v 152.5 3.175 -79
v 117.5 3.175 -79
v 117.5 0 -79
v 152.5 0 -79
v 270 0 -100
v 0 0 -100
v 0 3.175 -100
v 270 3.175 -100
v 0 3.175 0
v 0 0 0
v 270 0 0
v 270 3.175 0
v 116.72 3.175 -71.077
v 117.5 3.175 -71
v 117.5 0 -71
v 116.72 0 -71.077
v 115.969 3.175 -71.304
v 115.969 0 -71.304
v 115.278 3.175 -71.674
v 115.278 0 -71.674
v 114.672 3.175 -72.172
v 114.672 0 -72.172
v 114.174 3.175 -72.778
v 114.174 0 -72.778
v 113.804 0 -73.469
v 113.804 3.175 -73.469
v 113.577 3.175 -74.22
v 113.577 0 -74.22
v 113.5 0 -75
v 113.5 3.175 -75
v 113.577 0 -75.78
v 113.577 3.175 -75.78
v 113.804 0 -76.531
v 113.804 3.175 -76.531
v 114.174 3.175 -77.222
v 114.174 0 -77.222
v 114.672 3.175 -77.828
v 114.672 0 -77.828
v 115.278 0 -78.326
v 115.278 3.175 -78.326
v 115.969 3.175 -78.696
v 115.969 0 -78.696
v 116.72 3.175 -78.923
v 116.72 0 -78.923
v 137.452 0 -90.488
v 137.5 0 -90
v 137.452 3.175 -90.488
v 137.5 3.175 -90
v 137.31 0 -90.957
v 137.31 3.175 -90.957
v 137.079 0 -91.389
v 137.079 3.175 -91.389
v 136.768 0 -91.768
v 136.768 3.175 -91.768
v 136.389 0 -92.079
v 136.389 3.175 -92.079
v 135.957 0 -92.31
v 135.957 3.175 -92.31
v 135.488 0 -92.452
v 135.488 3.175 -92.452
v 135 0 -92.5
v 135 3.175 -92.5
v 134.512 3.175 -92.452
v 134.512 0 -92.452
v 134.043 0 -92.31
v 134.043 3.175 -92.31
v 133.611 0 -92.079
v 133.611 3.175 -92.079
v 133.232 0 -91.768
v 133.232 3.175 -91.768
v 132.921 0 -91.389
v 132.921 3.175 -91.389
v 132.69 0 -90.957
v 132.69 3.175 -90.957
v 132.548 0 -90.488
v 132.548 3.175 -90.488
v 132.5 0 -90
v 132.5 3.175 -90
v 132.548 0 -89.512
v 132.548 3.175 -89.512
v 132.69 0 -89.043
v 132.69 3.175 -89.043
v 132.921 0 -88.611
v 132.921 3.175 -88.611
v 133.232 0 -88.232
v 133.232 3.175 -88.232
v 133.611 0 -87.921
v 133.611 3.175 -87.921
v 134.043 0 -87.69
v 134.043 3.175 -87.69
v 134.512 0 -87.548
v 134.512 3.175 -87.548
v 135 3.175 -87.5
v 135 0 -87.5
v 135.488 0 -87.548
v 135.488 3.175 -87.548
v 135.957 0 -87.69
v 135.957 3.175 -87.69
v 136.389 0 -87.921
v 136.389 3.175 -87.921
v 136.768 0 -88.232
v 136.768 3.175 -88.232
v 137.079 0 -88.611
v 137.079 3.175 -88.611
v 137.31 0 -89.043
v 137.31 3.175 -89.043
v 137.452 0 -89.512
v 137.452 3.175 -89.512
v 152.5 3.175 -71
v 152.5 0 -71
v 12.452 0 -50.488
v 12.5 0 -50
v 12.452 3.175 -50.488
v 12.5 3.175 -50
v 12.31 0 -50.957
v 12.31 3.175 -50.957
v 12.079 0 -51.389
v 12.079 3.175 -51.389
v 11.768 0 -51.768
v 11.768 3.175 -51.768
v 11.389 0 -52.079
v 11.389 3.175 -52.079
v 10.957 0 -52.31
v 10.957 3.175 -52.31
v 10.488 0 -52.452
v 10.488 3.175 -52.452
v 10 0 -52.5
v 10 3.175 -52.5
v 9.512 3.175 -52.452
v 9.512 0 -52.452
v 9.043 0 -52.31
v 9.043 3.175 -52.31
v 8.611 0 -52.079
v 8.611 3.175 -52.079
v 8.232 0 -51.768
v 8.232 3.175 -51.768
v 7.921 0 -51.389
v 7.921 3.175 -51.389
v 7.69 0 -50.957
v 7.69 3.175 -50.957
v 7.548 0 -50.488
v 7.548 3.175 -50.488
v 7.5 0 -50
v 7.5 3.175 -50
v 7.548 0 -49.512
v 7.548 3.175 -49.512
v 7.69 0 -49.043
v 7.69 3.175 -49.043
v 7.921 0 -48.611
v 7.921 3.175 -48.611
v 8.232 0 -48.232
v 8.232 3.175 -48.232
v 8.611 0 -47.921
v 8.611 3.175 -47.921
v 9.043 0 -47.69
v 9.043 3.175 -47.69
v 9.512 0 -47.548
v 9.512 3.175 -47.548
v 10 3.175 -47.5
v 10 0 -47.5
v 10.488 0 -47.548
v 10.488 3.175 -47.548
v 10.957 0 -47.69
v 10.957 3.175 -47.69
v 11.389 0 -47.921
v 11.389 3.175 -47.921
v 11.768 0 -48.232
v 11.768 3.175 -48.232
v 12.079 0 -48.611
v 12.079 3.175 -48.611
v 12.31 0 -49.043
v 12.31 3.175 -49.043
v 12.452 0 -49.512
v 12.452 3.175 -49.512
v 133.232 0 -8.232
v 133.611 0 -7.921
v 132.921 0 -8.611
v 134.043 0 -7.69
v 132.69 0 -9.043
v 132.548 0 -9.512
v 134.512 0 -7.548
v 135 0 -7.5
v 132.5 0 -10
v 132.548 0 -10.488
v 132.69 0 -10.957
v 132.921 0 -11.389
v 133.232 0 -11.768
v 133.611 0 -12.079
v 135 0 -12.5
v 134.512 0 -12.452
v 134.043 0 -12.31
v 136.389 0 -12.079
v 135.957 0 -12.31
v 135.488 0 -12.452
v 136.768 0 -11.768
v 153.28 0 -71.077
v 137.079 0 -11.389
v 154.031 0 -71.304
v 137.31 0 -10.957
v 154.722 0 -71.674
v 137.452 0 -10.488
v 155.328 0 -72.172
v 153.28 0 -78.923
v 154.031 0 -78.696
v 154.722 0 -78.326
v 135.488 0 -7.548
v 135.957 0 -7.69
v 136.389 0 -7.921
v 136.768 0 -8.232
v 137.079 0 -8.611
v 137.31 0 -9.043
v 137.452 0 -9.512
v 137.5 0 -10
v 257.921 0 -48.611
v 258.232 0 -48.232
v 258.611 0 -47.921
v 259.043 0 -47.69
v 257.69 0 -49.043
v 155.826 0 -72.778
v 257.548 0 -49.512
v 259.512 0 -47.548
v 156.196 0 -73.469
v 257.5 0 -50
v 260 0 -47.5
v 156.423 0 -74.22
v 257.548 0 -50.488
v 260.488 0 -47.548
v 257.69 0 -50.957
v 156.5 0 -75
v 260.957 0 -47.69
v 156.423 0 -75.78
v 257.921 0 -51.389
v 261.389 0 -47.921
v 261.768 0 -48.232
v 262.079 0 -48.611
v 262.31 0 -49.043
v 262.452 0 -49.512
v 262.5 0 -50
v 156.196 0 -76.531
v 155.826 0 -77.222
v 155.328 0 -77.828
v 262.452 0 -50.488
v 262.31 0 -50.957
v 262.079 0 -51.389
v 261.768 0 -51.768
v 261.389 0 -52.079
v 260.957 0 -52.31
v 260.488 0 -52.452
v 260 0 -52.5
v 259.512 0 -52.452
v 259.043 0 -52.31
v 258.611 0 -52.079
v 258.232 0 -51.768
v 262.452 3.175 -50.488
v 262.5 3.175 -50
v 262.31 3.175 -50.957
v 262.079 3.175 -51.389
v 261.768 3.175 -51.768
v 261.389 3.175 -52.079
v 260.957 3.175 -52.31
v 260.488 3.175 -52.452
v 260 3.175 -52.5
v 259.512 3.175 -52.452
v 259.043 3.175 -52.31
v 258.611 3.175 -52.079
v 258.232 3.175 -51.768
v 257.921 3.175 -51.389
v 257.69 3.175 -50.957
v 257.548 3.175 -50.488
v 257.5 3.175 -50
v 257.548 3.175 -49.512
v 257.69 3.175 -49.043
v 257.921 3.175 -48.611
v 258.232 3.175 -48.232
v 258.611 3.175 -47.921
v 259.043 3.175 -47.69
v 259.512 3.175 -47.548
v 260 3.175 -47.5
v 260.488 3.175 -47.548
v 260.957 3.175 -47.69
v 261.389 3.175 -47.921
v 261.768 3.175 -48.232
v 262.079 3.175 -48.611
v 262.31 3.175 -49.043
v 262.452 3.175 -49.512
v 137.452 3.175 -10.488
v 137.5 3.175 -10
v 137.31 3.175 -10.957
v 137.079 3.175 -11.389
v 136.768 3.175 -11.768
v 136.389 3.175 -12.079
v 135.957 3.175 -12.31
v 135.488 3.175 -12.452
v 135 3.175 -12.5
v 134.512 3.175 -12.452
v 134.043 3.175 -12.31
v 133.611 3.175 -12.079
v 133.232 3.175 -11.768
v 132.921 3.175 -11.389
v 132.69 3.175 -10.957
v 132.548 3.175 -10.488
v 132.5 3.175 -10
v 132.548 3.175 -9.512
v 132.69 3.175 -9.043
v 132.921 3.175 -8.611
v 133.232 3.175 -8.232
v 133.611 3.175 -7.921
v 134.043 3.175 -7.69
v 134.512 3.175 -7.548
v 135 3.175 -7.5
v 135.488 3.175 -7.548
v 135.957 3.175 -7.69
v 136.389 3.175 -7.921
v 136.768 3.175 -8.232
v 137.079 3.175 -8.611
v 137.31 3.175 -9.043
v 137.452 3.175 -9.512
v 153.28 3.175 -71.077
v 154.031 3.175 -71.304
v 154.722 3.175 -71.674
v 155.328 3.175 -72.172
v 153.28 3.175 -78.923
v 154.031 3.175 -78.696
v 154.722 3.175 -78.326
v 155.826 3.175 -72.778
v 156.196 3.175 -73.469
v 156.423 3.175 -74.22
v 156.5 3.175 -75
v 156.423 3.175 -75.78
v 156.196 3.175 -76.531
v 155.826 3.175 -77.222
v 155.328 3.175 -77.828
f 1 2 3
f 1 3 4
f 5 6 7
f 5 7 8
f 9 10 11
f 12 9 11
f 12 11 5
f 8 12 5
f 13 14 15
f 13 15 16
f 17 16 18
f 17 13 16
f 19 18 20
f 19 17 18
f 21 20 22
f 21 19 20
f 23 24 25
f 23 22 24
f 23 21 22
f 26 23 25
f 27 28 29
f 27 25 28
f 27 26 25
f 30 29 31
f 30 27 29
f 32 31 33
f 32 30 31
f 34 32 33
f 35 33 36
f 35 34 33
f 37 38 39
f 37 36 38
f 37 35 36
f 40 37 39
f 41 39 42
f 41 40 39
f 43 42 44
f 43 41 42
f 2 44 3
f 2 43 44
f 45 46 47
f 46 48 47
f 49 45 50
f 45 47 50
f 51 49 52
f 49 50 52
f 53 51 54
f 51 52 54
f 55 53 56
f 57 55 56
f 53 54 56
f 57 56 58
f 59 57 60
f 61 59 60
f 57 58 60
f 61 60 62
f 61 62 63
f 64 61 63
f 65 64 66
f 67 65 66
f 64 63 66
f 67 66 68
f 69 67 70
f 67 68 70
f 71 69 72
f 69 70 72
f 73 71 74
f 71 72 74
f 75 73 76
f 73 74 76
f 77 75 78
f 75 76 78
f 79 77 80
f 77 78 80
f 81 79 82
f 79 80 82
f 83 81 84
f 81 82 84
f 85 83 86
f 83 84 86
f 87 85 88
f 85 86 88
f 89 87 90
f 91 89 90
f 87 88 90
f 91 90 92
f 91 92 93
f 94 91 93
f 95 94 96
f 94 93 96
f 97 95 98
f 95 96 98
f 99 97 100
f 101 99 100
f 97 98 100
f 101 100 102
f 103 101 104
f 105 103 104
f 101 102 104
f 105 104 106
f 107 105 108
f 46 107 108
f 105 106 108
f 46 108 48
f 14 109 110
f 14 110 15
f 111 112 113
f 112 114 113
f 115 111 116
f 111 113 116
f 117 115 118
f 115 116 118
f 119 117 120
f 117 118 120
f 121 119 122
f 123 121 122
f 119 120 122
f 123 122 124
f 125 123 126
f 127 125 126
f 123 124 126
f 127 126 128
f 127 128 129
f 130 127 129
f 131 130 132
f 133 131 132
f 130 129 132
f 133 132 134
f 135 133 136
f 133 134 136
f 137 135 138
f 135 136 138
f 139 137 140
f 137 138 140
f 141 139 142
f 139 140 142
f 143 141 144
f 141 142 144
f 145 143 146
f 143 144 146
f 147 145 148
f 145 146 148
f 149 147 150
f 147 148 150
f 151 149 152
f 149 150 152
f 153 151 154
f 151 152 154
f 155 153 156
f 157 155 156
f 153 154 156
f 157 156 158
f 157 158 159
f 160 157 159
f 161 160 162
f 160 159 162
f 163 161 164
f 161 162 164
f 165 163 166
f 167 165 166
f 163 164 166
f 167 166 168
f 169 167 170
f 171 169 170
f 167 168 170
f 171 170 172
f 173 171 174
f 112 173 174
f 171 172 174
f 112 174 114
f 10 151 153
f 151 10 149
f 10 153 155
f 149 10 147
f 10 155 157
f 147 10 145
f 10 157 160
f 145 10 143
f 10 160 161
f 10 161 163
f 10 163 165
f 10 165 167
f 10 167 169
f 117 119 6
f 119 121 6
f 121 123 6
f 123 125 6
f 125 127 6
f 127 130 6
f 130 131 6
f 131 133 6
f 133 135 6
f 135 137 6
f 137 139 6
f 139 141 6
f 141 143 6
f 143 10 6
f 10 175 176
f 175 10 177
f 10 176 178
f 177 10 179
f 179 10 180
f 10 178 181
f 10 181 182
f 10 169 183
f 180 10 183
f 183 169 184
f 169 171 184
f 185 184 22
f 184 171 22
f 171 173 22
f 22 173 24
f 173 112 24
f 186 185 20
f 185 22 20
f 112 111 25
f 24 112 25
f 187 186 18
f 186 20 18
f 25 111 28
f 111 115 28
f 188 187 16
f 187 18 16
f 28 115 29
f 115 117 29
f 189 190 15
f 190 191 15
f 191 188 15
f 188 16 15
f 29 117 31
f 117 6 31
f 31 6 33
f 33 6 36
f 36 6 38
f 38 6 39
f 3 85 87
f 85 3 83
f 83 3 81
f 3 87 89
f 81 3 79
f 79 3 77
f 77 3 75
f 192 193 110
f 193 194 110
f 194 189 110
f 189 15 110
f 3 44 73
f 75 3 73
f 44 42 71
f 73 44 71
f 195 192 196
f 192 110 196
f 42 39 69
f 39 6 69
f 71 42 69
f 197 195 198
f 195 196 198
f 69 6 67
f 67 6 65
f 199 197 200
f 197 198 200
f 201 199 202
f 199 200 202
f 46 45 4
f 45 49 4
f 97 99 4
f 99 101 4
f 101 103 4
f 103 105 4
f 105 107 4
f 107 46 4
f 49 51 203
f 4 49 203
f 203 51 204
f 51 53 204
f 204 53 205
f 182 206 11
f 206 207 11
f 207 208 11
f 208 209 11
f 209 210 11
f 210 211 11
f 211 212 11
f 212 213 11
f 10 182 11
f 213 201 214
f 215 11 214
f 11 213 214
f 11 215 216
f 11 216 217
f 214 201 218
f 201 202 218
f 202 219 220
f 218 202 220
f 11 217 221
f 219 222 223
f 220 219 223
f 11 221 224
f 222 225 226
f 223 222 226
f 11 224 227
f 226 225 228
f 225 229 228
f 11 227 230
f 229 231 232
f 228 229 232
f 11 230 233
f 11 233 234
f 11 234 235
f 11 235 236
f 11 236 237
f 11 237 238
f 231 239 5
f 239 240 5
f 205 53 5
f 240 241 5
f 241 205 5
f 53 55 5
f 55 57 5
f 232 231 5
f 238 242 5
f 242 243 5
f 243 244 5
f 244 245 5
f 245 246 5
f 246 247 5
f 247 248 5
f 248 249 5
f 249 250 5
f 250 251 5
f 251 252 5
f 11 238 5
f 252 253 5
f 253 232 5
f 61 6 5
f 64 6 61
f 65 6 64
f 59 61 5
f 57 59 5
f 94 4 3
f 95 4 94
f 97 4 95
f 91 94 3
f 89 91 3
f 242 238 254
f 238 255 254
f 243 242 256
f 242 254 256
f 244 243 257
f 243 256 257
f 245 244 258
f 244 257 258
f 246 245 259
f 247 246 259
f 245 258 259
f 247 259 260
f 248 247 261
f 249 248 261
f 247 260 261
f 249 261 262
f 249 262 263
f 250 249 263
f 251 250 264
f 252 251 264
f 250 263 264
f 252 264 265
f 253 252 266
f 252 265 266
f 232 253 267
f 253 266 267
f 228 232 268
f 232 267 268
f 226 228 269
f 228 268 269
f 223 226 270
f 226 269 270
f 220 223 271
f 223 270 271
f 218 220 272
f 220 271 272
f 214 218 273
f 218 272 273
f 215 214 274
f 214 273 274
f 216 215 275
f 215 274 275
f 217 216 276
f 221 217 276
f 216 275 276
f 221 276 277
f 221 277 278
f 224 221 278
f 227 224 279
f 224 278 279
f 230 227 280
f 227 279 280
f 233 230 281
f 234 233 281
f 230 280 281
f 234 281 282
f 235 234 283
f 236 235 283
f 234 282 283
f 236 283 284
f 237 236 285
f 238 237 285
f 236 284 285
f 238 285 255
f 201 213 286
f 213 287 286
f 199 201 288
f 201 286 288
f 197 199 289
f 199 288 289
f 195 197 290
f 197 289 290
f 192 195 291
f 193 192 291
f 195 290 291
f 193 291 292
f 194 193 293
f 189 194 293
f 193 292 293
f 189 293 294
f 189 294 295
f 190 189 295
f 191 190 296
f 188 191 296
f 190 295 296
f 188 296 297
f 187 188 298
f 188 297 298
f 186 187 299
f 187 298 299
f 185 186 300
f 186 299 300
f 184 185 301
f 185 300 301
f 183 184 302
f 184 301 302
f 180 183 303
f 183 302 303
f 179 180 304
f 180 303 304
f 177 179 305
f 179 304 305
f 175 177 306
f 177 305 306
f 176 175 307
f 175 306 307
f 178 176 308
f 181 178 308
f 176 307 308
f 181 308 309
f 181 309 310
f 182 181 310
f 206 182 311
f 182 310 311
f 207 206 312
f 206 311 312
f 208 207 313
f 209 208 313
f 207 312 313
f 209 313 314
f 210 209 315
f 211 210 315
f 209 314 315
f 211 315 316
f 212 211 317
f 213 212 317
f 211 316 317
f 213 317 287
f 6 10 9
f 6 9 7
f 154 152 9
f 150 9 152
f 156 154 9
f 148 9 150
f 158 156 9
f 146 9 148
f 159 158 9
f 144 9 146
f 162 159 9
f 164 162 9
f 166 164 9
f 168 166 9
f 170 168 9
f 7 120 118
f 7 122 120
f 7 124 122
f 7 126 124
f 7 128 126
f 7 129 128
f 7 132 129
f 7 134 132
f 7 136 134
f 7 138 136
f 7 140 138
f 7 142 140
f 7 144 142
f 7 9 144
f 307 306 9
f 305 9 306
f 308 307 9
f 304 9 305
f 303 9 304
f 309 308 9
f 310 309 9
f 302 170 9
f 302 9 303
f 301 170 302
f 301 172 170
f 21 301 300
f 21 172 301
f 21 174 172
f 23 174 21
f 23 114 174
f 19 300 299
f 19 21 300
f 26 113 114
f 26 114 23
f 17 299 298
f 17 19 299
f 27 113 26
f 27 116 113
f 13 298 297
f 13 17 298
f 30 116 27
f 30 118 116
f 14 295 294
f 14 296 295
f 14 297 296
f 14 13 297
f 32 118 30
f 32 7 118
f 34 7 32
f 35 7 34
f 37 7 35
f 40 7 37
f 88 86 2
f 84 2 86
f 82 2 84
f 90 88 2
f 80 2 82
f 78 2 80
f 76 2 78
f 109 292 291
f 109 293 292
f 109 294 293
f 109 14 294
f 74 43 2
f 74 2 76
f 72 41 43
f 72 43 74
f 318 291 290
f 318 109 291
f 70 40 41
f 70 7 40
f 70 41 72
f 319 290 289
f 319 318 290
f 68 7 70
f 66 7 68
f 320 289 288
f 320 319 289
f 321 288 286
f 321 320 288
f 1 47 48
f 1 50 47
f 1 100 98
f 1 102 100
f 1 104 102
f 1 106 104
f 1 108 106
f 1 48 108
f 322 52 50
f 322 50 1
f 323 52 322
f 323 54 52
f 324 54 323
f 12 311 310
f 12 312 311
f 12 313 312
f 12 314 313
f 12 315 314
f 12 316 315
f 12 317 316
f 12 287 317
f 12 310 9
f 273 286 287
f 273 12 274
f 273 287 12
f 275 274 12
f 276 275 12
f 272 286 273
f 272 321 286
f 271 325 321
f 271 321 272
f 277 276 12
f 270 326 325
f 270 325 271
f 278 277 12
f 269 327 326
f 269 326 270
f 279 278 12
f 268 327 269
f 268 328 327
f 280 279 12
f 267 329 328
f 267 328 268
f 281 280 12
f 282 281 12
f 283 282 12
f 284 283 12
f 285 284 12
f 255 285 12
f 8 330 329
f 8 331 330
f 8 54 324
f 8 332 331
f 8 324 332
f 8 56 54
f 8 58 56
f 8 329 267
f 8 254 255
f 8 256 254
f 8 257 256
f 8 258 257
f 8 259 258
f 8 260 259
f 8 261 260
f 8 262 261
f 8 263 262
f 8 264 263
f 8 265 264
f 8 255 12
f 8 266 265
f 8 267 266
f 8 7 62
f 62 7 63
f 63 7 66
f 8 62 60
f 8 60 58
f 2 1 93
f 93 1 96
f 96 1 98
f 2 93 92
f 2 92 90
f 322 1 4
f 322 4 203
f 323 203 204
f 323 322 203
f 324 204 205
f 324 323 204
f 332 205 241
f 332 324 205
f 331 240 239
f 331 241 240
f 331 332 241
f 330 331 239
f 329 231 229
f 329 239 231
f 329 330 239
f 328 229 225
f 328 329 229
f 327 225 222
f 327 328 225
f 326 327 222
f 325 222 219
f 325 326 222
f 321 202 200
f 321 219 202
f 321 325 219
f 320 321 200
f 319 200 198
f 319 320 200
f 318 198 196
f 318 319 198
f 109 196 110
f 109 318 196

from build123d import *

# Parameters (mm, degrees)
SKETCH1_W               = 270
SKETCH1_H               = 100
BOSS_EXTRUDE1_DEPTH     = 3.175
SKETCH1_H_2             = 140
BOSS_EXTRUDE1_2_DEPTH   = 3.175
SKETCH2_R               = 2.5
CUT_EXTRUDE1_DEPTH      = 1
CUT_EXTRUDE1_DEPTH_BACK = 4.175


with BuildPart() as part:
    # Sketch1 → Boss-Extrude1 (new body)
    with BuildSketch(Plane(origin=(0, 0, 0), x_dir=(1, 0, 0), z_dir=(0, 1, 0))):
        with Locations((135, 50)):
            Rectangle(SKETCH1_W, SKETCH1_H)
    extrude(amount=BOSS_EXTRUDE1_DEPTH)


with BuildPart() as body_2:
    # Sketch1 → Boss-Extrude1 2 (new body)
    with BuildSketch(Plane(origin=(0, 0, 0), x_dir=(1, 0, 0), z_dir=(0, 1, 0))):
        with Locations((135, 175)):
            Rectangle(SKETCH1_W, SKETCH1_H_2)
    extrude(amount=BOSS_EXTRUDE1_2_DEPTH)


with BuildPart() as cut_extrude1_tool:
    # Sketch2 → Cut-Extrude1 (new body, two sides)
    with BuildSketch(Plane(origin=(0, 3.175, 0), x_dir=(1, 0, 0), z_dir=(0, 1, 0))) as cut_extrude1_sk:
        with Locations((10, 175)):
            Circle(SKETCH2_R)
        with Locations((10, 50)):
            Circle(SKETCH2_R)
        with Locations((260, 50)):
            Circle(SKETCH2_R)
        with Locations((260, 175)):
            Circle(SKETCH2_R)
        with Locations((135, 115)):
            Circle(SKETCH2_R)
        with Locations((135, 235)):
            Circle(SKETCH2_R)
        with Locations((135, 90)):
            Circle(SKETCH2_R)
        with Locations((135, 10)):
            Circle(SKETCH2_R)
        with BuildLine():
            Line((117.5, 79), (152.5, 79))
            ThreePointArc((152.5, 79), (156.5, 75), (152.5, 71))
            Line((152.5, 71), (117.5, 71))
            ThreePointArc((117.5, 71), (113.5, 75), (117.5, 79))
        make_face()
    extrude(amount=CUT_EXTRUDE1_DEPTH)
    extrude(cut_extrude1_sk.sketch, amount=-CUT_EXTRUDE1_DEPTH_BACK)


with BuildPart() as part_1:
    add(part.part)

    # Cut-Extrude1: cut by cut_extrude1_tool
    add(cut_extrude1_tool.part, mode=Mode.SUBTRACT)


with BuildPart() as body_2_1:
    add(body_2.part)

    # Cut-Extrude1: cut by cut_extrude1_tool
    add(cut_extrude1_tool.part, mode=Mode.SUBTRACT)


solid = part_1.part
